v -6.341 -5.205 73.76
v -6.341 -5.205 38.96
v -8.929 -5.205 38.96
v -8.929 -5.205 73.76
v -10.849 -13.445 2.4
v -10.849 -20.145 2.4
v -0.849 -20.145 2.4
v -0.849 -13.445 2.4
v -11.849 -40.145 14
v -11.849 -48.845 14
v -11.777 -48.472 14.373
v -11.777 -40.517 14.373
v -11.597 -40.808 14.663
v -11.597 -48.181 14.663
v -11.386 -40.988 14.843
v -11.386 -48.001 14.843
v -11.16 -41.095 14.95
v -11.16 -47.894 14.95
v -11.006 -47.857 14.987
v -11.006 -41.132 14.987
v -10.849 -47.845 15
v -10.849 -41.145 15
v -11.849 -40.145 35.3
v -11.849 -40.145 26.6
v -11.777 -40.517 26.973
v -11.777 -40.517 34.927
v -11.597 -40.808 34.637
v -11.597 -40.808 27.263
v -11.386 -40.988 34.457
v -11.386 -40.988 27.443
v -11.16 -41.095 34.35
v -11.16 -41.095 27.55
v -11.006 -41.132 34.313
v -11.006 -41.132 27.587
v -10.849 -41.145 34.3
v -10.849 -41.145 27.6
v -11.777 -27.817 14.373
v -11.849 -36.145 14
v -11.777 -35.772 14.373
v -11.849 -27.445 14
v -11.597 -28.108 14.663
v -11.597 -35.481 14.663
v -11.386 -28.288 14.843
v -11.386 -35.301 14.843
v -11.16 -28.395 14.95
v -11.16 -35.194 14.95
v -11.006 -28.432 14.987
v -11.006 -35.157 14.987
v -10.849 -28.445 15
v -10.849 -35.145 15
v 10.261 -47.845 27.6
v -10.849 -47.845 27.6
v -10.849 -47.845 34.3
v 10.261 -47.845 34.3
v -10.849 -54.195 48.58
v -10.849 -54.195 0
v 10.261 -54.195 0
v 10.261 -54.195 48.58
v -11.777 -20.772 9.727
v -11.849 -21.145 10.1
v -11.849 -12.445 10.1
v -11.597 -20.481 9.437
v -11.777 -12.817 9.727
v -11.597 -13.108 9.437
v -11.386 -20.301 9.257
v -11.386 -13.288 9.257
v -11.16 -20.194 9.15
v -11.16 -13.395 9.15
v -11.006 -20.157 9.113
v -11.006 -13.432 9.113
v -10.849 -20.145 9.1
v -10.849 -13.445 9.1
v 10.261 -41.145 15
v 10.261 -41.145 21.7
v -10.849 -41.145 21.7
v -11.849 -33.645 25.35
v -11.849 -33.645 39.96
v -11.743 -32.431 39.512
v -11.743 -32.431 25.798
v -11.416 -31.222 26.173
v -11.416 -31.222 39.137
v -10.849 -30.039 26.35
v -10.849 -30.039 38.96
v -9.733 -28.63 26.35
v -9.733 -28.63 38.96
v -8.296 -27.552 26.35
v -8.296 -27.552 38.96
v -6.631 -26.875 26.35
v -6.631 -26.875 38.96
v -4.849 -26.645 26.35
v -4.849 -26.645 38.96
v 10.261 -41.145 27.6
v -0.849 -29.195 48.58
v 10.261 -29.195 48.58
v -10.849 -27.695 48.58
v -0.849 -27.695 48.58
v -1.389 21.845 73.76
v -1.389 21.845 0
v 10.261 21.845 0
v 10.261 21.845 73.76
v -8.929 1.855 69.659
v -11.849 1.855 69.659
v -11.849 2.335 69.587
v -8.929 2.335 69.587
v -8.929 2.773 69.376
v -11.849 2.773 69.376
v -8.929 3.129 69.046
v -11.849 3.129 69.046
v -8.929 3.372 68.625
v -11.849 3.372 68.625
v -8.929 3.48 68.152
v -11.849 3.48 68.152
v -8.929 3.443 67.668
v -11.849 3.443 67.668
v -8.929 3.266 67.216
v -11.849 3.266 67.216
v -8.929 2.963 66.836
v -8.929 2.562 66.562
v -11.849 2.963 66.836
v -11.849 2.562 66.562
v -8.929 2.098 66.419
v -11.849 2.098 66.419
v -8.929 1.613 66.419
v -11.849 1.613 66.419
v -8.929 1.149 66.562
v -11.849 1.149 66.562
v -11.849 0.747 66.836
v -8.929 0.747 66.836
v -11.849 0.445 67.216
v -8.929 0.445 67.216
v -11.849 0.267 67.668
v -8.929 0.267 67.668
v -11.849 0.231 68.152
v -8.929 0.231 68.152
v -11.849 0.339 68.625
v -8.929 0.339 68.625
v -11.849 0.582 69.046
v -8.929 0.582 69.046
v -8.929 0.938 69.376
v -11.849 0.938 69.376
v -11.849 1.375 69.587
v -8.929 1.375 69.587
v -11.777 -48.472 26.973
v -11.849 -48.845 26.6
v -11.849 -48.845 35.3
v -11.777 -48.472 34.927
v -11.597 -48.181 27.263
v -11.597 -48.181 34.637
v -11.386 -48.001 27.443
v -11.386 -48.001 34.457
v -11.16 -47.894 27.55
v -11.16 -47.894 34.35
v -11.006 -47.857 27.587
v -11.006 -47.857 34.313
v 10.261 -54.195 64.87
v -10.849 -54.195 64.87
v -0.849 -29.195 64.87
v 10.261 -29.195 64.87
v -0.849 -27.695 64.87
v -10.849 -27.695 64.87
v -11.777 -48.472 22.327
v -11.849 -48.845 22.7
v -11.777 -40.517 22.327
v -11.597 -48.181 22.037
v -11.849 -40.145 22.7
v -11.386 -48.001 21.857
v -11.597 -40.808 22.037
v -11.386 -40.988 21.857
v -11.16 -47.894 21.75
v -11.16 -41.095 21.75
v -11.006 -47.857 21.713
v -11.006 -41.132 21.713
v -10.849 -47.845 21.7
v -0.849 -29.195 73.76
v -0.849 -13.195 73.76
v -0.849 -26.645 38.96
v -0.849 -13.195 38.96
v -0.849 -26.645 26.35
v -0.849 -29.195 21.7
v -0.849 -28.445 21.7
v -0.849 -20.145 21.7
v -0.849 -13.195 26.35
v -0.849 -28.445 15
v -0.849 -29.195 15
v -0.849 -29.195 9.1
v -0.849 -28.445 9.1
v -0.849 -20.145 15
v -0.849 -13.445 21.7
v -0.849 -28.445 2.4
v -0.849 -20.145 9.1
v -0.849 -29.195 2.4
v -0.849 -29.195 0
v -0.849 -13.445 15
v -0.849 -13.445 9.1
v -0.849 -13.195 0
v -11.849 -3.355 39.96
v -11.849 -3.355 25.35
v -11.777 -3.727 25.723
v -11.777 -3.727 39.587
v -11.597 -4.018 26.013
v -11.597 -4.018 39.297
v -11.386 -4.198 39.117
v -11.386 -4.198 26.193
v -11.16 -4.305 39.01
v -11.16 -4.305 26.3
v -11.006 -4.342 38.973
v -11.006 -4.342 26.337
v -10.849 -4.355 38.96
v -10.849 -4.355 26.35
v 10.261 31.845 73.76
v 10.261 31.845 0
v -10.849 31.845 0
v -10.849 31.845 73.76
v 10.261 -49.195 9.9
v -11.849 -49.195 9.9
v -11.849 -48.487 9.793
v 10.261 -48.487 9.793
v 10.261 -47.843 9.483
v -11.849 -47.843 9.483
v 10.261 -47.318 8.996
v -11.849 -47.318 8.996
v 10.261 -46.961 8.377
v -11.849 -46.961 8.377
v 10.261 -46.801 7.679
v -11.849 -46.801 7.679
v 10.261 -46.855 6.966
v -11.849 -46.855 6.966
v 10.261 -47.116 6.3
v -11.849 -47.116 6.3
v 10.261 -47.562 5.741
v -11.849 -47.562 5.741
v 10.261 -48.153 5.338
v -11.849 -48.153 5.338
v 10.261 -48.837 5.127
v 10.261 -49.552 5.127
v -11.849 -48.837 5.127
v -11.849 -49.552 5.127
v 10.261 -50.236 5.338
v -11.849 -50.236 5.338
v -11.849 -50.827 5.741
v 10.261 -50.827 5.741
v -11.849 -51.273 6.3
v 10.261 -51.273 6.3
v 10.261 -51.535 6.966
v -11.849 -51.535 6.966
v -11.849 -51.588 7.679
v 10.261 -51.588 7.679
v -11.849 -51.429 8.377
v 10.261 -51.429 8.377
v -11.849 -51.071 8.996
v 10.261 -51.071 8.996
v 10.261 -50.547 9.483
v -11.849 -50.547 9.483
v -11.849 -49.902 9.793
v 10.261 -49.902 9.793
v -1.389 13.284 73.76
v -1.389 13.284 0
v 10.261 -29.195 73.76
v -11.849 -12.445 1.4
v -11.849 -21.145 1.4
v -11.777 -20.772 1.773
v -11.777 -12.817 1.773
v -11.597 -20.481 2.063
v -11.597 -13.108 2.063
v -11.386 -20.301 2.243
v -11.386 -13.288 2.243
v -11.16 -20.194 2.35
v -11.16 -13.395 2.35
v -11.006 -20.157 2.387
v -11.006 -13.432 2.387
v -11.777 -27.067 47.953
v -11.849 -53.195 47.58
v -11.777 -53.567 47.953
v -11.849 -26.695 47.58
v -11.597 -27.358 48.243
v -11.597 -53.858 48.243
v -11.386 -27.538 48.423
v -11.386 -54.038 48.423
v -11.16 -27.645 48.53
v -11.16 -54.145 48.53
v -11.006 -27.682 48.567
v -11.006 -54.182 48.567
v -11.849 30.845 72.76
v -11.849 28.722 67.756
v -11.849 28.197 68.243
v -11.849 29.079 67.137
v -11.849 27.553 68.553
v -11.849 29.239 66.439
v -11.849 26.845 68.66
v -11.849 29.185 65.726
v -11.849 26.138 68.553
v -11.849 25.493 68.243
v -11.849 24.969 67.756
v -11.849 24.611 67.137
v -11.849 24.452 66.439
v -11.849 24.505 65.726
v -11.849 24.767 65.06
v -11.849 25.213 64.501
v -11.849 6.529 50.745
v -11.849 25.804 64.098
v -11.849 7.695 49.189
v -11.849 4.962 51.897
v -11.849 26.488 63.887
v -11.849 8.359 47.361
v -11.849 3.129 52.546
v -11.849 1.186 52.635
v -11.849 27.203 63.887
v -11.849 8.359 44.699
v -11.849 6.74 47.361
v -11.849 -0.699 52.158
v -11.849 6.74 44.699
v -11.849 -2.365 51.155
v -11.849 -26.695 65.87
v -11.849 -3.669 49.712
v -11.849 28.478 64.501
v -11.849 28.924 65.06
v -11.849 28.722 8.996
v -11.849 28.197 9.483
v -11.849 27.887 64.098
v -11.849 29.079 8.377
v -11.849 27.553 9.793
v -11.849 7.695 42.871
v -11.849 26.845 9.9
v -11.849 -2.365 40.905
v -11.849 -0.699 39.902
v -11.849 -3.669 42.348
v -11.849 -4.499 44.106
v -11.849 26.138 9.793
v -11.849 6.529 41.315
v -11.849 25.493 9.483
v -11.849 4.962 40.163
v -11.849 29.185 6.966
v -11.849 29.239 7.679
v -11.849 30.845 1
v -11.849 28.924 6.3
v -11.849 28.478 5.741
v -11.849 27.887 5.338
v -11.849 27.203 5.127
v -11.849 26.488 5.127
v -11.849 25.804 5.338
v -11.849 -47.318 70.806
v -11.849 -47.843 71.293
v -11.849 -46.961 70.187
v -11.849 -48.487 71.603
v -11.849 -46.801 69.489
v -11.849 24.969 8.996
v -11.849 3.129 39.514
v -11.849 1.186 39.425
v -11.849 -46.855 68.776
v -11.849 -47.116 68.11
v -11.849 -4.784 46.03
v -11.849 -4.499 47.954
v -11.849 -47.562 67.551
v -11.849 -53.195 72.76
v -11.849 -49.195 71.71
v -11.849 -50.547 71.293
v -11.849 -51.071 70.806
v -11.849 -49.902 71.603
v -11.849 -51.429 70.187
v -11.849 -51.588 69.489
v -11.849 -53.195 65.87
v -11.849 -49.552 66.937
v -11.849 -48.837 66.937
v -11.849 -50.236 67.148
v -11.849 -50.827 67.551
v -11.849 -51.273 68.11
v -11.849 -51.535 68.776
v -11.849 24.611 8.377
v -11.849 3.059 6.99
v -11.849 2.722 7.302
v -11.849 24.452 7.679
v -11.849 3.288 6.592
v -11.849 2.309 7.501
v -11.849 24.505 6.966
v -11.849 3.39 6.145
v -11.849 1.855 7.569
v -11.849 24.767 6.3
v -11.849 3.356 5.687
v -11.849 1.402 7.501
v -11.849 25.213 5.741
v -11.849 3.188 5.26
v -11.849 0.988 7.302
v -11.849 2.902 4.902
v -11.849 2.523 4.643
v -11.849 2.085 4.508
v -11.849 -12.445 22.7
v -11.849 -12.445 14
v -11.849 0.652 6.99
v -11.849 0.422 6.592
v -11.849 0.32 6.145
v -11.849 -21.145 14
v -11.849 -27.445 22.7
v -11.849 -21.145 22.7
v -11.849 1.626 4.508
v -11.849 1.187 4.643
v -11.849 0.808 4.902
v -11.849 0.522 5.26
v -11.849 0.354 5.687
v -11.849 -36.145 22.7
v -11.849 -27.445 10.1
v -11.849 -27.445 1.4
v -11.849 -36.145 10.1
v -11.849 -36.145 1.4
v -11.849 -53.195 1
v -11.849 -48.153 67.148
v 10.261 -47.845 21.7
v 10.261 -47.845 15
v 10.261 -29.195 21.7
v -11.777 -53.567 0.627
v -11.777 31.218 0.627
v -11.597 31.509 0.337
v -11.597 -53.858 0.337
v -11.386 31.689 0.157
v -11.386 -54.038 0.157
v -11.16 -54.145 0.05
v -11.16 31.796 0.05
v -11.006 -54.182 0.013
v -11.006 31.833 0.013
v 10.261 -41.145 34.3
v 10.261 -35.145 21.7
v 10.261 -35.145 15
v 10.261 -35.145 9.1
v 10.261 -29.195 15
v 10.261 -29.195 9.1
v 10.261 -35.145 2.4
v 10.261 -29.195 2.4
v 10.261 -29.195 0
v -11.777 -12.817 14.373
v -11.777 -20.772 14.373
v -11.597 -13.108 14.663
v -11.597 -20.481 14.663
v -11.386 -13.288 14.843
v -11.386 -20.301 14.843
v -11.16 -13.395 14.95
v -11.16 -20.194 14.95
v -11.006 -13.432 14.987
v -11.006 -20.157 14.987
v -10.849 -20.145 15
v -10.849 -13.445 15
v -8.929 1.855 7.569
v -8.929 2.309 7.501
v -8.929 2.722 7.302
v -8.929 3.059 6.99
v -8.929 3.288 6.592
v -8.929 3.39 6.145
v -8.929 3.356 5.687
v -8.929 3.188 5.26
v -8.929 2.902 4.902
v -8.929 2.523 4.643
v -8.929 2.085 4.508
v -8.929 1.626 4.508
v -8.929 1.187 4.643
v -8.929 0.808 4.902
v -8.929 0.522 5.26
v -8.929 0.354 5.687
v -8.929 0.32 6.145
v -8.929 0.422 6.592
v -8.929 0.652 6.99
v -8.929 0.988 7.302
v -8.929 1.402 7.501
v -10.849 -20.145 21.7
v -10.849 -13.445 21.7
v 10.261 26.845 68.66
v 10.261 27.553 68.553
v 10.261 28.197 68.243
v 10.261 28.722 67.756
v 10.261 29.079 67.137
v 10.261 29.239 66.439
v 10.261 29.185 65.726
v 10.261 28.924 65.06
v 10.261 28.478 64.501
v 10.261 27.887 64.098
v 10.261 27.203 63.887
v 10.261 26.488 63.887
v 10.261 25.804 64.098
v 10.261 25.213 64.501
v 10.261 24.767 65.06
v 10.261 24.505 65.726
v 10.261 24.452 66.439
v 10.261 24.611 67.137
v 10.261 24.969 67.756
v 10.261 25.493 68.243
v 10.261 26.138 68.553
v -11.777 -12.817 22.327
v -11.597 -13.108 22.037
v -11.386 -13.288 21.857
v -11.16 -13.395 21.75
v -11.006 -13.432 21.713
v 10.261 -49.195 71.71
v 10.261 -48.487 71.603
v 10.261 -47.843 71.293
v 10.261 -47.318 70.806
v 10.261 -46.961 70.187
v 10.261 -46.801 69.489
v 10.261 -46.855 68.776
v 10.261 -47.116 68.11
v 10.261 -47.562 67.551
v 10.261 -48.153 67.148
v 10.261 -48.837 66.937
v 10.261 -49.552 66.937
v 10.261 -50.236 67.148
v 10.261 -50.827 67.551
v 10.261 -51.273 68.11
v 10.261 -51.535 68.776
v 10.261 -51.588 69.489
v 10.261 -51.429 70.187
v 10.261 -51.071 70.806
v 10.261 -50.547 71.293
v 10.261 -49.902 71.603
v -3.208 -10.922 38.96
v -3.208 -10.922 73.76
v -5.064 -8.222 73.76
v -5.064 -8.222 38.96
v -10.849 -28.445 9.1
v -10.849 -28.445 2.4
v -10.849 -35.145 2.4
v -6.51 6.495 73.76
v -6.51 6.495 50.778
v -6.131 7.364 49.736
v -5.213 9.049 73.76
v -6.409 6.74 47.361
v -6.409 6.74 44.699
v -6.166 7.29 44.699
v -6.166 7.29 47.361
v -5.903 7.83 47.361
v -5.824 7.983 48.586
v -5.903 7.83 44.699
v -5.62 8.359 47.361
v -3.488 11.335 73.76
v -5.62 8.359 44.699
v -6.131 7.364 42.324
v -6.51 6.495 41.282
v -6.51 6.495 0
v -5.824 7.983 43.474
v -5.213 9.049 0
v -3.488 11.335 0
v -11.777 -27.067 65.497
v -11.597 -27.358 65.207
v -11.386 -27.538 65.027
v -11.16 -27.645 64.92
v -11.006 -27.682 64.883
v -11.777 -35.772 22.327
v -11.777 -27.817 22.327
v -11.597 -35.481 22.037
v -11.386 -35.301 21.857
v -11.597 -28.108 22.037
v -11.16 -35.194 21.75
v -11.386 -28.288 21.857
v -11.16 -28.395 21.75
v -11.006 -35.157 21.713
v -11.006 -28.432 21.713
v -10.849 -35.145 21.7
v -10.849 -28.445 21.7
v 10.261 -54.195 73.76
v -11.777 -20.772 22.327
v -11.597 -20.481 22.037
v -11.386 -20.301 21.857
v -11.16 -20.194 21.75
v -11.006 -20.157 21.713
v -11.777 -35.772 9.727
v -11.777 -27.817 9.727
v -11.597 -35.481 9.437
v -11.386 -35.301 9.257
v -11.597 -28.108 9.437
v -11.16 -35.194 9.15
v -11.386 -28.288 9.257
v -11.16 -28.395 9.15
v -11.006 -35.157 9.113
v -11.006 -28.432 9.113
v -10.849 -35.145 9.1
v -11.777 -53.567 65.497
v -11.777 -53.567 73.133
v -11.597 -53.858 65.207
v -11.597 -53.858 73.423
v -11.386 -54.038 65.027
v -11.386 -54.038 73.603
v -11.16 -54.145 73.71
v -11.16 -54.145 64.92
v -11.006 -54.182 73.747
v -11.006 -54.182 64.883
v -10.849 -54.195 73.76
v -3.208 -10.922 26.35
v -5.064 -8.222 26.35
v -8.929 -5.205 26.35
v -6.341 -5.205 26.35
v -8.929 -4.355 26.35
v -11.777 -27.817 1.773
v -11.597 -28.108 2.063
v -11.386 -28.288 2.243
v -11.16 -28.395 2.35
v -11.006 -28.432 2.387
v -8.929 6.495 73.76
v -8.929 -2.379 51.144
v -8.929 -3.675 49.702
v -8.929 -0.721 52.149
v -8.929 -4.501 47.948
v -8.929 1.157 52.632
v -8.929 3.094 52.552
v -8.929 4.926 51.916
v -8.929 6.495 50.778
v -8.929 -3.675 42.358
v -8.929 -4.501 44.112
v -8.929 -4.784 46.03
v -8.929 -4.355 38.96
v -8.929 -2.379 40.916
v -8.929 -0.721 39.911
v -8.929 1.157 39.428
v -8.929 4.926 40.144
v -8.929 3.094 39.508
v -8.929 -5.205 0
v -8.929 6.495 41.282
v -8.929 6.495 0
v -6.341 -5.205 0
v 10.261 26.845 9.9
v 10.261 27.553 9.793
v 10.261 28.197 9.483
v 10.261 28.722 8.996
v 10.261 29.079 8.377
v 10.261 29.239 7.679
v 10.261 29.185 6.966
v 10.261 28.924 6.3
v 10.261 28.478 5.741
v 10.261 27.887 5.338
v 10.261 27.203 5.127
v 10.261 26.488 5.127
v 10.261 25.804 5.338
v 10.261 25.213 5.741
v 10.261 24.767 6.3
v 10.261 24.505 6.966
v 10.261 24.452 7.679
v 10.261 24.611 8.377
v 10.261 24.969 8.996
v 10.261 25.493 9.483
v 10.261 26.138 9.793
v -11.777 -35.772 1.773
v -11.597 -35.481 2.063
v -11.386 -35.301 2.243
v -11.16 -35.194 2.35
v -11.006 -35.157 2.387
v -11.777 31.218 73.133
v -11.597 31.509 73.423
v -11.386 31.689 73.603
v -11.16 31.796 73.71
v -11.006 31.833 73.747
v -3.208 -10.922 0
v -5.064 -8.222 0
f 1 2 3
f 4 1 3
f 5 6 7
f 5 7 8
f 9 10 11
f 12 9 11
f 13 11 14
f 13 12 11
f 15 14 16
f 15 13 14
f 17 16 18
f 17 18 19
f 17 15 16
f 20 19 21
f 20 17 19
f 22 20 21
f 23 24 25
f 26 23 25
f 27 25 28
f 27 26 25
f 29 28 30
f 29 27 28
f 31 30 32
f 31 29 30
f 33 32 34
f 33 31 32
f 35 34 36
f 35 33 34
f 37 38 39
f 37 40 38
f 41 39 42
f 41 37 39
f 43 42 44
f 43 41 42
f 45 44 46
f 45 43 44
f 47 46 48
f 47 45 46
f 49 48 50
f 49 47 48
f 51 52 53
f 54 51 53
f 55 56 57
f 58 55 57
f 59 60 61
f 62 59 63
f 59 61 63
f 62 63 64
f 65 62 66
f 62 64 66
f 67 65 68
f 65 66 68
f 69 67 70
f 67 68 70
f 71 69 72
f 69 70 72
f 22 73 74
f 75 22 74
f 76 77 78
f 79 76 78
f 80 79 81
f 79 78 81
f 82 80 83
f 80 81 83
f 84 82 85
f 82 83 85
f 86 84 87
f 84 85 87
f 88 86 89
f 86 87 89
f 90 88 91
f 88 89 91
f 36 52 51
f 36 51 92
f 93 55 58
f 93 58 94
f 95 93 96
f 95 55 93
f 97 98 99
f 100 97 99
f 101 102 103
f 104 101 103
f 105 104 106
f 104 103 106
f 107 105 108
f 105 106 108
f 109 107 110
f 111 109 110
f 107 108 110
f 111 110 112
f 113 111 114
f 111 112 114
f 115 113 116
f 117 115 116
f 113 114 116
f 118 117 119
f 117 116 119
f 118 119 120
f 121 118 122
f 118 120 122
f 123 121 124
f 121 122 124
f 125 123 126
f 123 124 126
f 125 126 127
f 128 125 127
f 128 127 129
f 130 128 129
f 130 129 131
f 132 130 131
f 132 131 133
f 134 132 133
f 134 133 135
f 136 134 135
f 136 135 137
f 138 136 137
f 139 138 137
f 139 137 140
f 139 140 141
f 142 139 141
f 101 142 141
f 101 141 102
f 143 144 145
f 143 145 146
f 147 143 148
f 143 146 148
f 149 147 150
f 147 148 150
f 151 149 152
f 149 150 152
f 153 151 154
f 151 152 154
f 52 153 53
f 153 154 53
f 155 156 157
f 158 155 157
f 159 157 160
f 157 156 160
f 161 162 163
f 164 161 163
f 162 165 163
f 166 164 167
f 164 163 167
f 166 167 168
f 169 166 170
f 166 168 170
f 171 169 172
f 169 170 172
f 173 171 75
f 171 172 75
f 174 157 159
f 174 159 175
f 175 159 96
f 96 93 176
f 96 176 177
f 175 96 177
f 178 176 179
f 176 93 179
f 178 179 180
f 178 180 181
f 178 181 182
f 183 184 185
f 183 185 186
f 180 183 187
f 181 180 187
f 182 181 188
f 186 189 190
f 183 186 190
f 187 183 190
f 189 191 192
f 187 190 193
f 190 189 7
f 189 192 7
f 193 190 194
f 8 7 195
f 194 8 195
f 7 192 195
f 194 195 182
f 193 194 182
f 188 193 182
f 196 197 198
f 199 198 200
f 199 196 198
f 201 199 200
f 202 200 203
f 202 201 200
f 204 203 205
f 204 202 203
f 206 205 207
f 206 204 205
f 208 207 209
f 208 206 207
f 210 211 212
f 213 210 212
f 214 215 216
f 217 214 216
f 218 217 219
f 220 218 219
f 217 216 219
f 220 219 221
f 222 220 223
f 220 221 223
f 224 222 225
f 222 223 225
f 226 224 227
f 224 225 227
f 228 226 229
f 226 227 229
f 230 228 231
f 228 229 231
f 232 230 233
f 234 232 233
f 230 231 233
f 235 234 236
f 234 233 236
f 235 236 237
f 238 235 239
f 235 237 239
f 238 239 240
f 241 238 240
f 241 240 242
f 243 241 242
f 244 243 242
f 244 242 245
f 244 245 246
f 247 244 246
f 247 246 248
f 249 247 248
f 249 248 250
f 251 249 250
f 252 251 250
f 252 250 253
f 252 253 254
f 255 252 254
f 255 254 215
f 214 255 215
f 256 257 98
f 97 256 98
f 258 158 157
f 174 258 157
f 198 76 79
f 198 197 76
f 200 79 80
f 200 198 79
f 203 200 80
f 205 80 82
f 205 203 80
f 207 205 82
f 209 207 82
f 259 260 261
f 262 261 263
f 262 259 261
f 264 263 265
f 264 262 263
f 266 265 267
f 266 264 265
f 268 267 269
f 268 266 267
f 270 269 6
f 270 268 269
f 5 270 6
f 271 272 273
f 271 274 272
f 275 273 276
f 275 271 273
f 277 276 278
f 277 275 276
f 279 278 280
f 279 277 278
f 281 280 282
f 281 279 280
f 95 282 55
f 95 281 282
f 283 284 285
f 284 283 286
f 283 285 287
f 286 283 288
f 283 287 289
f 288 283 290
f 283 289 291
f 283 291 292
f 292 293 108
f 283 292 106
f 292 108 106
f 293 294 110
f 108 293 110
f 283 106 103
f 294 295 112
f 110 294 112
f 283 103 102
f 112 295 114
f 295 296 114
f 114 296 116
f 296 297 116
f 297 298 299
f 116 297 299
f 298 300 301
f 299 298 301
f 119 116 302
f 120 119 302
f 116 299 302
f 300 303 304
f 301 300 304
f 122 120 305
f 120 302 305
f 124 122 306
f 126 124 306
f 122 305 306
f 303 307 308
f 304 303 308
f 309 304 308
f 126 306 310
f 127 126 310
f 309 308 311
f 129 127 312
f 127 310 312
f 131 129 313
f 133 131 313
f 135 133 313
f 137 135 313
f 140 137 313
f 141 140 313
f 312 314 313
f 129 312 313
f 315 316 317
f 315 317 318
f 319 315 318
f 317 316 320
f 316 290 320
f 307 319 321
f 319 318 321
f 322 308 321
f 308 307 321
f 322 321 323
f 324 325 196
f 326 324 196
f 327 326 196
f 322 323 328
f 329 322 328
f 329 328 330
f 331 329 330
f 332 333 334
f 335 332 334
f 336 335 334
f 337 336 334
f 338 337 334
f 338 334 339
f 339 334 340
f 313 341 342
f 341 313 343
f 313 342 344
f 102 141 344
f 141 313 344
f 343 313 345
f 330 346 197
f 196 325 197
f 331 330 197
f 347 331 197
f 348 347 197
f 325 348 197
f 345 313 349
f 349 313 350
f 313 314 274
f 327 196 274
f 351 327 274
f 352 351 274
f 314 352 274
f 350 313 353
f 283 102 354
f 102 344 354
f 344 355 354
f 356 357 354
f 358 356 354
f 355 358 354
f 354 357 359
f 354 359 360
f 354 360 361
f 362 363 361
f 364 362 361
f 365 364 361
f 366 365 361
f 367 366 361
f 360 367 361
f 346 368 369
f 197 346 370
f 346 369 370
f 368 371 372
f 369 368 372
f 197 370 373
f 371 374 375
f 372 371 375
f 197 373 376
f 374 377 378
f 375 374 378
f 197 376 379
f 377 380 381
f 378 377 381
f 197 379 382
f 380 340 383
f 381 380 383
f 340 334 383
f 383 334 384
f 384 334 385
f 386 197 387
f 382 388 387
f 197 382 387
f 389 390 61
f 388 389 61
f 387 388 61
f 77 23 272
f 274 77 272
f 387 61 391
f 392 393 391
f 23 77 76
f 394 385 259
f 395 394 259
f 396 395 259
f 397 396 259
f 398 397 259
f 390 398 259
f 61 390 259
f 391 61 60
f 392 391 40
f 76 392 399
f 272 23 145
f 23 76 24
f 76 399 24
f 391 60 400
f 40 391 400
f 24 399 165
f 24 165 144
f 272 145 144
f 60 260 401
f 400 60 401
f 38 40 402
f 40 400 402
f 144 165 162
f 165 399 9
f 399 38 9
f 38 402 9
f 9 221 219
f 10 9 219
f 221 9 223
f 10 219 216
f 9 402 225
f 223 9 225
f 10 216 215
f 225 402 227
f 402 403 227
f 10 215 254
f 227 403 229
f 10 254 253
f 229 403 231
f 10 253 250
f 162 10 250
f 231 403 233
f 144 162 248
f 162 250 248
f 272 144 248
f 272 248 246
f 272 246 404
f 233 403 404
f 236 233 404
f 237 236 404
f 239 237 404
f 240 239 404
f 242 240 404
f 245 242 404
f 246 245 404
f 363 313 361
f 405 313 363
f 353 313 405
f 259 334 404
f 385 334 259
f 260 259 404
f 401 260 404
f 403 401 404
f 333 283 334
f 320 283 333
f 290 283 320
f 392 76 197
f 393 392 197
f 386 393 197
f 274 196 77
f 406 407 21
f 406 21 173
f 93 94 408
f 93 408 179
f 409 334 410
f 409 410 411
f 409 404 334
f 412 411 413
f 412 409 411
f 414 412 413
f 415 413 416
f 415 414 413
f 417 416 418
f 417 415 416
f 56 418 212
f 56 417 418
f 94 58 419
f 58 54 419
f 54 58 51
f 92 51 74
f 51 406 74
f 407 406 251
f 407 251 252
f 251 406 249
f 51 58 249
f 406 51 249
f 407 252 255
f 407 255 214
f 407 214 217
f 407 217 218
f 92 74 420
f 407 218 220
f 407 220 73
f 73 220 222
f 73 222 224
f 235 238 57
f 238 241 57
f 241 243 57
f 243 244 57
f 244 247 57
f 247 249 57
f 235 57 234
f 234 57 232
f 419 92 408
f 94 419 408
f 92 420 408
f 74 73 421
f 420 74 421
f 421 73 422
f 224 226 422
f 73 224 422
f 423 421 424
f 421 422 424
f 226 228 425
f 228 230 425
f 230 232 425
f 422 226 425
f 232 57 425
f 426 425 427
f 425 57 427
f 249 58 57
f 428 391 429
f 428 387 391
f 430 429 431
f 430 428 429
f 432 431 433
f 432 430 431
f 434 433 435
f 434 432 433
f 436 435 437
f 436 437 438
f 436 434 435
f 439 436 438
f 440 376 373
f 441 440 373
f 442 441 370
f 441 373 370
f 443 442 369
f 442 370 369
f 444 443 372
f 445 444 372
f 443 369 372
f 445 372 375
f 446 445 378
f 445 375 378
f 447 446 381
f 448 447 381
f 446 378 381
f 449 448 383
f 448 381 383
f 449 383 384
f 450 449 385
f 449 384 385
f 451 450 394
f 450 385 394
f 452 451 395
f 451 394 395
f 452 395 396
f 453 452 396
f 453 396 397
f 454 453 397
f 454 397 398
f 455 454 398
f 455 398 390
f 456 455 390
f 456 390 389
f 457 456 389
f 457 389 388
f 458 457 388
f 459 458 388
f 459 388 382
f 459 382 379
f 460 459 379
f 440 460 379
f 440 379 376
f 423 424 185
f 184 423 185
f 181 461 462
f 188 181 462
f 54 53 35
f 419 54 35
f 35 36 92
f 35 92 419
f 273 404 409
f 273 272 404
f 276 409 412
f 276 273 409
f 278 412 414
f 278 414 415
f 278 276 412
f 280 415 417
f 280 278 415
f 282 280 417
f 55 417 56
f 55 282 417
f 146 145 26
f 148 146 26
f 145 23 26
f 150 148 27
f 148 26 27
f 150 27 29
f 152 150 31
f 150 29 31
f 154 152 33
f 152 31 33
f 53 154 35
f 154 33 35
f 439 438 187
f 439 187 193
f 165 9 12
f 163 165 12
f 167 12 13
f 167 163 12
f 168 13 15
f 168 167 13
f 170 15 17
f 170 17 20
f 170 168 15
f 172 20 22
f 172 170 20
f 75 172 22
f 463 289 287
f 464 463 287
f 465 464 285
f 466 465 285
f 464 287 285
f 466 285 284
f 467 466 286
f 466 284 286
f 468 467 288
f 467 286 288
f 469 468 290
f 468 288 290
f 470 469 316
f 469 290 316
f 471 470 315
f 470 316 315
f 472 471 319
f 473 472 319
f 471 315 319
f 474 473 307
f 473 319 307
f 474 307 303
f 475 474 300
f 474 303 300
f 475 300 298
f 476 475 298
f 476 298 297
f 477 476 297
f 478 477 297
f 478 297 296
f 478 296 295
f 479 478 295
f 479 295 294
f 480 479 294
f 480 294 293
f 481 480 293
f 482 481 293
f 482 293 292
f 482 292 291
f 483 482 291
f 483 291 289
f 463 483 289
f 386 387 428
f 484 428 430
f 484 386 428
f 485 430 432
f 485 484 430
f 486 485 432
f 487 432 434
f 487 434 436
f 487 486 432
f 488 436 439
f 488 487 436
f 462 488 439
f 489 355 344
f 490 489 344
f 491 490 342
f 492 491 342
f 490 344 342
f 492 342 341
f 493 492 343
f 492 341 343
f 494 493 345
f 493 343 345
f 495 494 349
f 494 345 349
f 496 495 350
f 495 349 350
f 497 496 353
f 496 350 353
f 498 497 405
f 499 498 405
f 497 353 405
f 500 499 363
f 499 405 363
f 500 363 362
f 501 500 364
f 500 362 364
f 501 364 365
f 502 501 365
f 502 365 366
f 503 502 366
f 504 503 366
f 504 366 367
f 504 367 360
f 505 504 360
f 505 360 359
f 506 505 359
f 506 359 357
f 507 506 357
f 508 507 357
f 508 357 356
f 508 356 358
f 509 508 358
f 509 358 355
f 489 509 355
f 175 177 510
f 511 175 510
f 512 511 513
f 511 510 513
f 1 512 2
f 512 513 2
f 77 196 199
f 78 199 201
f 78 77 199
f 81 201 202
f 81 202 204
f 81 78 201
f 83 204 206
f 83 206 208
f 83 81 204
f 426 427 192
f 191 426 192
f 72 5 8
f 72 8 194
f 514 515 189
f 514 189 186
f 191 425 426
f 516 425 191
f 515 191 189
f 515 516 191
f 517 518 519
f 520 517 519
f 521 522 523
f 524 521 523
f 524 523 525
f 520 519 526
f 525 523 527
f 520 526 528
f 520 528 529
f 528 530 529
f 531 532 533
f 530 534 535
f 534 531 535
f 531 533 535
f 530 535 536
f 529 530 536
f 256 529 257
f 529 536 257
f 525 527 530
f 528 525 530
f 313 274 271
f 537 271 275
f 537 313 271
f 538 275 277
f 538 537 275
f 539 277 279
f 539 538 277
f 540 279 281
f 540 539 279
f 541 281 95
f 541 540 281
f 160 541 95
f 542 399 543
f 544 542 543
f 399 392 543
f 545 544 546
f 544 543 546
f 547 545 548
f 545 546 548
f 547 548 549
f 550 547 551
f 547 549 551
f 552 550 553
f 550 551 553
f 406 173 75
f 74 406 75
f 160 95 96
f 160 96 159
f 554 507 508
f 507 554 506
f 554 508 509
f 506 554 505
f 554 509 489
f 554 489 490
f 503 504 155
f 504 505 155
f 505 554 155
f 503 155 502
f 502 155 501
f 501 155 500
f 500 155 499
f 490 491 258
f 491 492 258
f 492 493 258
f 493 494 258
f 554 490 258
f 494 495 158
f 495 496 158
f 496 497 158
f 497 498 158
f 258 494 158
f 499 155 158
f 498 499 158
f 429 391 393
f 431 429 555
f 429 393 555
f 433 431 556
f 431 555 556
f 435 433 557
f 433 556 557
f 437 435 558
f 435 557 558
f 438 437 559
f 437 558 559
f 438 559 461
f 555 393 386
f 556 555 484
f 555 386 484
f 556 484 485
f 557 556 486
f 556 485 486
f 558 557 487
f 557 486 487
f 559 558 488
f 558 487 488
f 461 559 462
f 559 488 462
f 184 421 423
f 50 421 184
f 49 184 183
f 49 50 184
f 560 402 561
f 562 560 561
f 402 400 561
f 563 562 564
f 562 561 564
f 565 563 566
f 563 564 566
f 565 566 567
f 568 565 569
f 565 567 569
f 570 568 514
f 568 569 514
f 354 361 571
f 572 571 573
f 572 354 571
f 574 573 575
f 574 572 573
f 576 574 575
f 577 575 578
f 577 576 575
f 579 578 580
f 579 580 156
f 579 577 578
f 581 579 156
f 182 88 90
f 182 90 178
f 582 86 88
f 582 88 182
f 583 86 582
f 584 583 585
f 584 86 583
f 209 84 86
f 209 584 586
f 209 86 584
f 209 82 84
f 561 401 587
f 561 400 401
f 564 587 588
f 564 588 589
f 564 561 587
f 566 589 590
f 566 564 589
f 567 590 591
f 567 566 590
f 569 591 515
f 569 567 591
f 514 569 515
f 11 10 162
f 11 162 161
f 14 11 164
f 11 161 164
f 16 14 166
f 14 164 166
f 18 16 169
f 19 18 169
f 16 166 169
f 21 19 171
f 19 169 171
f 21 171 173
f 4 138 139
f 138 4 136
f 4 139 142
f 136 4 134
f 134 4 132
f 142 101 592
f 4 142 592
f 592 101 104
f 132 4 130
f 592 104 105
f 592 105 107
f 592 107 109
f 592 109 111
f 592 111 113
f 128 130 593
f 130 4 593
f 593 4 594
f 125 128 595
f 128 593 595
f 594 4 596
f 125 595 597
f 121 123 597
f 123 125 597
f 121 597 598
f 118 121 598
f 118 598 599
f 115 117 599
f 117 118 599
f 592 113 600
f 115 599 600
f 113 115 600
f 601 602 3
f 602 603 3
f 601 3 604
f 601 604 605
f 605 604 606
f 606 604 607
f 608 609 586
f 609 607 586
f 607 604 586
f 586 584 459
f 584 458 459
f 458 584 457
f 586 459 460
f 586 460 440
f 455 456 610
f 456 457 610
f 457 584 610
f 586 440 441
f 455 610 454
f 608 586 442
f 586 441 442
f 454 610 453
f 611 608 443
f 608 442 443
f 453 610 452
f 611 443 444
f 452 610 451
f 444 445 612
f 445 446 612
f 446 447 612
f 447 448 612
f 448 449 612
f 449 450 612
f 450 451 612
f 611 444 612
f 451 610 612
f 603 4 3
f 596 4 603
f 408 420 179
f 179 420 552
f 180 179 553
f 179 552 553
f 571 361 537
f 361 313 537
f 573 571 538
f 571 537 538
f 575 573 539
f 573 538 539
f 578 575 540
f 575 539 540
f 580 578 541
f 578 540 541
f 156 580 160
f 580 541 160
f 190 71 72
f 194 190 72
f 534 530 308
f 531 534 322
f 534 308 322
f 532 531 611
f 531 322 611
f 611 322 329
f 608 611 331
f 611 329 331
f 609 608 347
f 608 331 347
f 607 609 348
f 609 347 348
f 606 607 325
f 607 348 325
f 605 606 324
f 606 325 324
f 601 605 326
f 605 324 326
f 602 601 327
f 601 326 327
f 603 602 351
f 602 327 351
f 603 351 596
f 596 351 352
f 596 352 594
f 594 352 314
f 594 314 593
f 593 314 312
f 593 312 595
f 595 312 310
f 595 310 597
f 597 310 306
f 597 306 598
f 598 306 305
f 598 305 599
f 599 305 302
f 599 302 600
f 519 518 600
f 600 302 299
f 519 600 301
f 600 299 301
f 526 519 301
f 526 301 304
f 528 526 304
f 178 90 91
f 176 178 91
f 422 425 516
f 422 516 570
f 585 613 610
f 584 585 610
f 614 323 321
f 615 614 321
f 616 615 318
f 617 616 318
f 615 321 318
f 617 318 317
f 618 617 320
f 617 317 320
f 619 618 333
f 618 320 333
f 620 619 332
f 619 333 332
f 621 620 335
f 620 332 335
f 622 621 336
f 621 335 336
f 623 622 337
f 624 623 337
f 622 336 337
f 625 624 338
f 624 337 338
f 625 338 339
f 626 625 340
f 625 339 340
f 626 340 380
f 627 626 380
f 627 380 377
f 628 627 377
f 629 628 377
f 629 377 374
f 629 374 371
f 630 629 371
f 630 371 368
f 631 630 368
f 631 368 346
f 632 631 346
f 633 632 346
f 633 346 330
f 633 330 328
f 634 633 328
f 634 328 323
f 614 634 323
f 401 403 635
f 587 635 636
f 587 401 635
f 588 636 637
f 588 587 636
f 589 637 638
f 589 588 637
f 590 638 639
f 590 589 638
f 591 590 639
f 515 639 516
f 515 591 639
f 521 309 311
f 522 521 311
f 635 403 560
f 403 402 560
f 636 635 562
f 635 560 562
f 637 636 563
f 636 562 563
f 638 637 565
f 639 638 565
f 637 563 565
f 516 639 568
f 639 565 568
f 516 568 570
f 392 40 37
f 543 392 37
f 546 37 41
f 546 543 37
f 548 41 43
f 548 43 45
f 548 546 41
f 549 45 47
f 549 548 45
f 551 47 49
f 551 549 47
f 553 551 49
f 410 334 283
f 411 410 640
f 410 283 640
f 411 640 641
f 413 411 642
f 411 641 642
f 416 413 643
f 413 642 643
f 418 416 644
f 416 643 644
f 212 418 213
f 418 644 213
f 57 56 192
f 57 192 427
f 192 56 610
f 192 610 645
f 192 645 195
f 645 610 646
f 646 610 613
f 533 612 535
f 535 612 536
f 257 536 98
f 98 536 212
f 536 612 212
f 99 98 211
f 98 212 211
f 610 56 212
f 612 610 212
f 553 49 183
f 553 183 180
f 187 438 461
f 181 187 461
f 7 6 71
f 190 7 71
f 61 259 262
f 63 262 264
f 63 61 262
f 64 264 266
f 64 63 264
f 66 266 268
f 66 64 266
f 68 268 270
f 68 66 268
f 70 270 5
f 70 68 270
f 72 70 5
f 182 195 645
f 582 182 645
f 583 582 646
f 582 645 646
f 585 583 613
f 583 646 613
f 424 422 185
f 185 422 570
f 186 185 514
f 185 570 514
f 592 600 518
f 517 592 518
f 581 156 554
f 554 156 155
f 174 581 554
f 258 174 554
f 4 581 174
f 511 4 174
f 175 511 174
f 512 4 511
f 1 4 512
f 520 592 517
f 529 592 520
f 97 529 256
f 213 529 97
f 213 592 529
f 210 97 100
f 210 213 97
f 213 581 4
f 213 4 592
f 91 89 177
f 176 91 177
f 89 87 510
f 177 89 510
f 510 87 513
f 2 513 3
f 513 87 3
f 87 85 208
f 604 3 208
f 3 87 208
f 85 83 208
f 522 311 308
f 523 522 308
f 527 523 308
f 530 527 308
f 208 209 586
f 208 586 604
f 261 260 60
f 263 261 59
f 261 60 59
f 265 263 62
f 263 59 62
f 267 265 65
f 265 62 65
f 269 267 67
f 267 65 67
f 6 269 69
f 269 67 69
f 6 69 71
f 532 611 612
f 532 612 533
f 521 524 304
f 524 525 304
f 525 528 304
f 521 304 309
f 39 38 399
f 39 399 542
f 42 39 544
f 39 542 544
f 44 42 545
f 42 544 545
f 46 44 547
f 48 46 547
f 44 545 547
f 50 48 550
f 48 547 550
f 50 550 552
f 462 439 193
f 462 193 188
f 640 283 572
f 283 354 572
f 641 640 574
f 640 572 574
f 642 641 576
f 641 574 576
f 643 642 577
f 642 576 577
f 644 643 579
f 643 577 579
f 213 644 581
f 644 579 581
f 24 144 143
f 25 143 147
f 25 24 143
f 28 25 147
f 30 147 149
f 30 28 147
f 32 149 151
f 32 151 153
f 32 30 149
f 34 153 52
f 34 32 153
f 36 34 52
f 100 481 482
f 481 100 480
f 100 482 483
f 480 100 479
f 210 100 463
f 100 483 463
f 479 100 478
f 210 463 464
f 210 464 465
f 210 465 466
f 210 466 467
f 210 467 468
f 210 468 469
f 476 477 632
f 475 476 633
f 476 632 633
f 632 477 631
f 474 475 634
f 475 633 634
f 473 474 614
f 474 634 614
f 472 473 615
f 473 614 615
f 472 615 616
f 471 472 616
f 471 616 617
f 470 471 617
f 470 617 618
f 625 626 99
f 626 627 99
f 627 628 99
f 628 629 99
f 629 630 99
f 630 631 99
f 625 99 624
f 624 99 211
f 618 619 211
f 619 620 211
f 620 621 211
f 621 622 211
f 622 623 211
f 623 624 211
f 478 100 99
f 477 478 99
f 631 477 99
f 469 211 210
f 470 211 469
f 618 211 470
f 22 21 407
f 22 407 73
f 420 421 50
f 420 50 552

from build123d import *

# Parameters (mm, degrees)
PROFILEEXTRUDE_DEPTH    = 73.76
HOSEWINDOW_W            = 16.29
HOSEWINDOW_H            = 26.5
HOSEWINDOWCUT_DEPTH     = 23.11
CAGESCREWS_R            = 2.4
CAGESCREWSCUT_DEPTH     = 23.11
AXLEHOLECUT_DEPTH       = 23.11
SETSCREWHOLES_R         = 1.539432213
SETSCREWHOLES_R_2       = 1.628953018
SETSCREWHOLESCUT_DEPTH  = 23.11
VELOCITYWINDOW_W        = 12.61
VELOCITYWINDOW_H        = 22.29
VELOCITYWINDOWCUT_DEPTH = 23.11
FILLET3_R               = 7
TRIGGERRACKSLOTCUT_W    = 6.7
TRIGGERRACKSLOTCUT_H    = 6.7
RACKSLOTCUT_DEPTH       = 23.11
FILLET4_R               = 1


with BuildPart() as part:
    # Profile → ProfileExtrude (new body)
    with BuildSketch(Plane.XY):
        with BuildLine():
            Line((10.261269376, -54.194713793), (10.261269376, -29.194713793))
            Line((10.261269376, -29.194713793), (-0.848730624, -29.194713793))
            Line((-0.848730624, -29.194713793), (-0.848730624, -13.194713793))
            ThreePointArc((-0.848730624, -13.194713793), (-4.204080189, -9.618555822), (-6.340730624, -5.204713793))
            Line((-6.340730624, -5.204713793), (-8.928730624, -5.204713793))
            Line((-8.928730624, -5.204713793), (-8.928730624, 6.495286207))
            Line((-8.928730624, 6.495286207), (-6.509650624, 6.495286207))
            ThreePointArc((-6.509650624, 6.495286207), (-4.40075771, 10.230064383), (-1.388730624, 13.283536207))
            Line((-1.388730624, 13.283536207), (-1.388730624, 21.845286207))
            Line((-1.388730624, 21.845286207), (10.261269376, 21.845286207))
            Line((10.261269376, 21.845286207), (10.261269376, 31.845286207))
            Line((10.261269376, 31.845286207), (-11.848730624, 31.845286207))
            Line((-11.848730624, 31.845286207), (-11.848730624, -54.194713793))
            Line((-11.848730624, -54.194713793), (10.261269376, -54.194713793))
        make_face()
    extrude(amount=PROFILEEXTRUDE_DEPTH)

    # HoseWindow → HoseWindowCut (cut, through all)
    with BuildSketch(Plane.ZY.offset(11.848730624)):
        with Locations((56.725, -40.944713793)):
            Rectangle(HOSEWINDOW_W, HOSEWINDOW_H)
    extrude(amount=-HOSEWINDOWCUT_DEPTH, mode=Mode.SUBTRACT)

    # CageScrews → CageScrewsCut (cut, through all)
    with BuildSketch(Plane.ZY.offset(11.848730624)):
        with Locations((7.5, 26.845286207)):
            Circle(CAGESCREWS_R)
        with Locations((66.26, 26.845286207)):
            Circle(CAGESCREWS_R)
        with Locations((7.5, -49.194713793)):
            Circle(CAGESCREWS_R)
        with Locations((69.31, -49.194713793)):
            Circle(CAGESCREWS_R)
    extrude(amount=-CAGESCREWSCUT_DEPTH, mode=Mode.SUBTRACT)

    # AxleHole → AxleHoleCut (cut, through all)
    with BuildSketch(Plane.ZY.offset(11.848730624)):
        with BuildLine():
            Line((47.361, 8.359497151), (47.361, 6.740497151))
            Line((47.361, 6.740497151), (44.699, 6.740497151))
            Line((44.699, 6.740497151), (44.699, 8.359497151))
            ThreePointArc((44.699, 8.359497151), (46.03, -4.783713793), (47.361, 8.359497151))
        make_face()
    extrude(amount=-AXLEHOLECUT_DEPTH, mode=Mode.SUBTRACT)

    # SetScrewHoles → SetScrewHolesCut (cut, through all)
    with BuildSketch(Plane.ZY.offset(11.848730624)):
        with Locations((6.03, 1.855286207)):
            Circle(SETSCREWHOLES_R)
        with Locations((68.03, 1.855286207)):
            Circle(SETSCREWHOLES_R_2)
    extrude(amount=-SETSCREWHOLESCUT_DEPTH, mode=Mode.SUBTRACT)

    # VelocityWindow → VelocityWindowCut (cut, through all)
    with BuildSketch(Plane.ZY.offset(11.848730624)):
        with Locations((32.655, -15.499713793)):
            Rectangle(VELOCITYWINDOW_W, VELOCITYWINDOW_H)
    extrude(amount=-VELOCITYWINDOWCUT_DEPTH, mode=Mode.SUBTRACT)

    # Fillet3
    fillet3_edges = [part.edges().sort_by_distance(p)[0] for p in [
        (-11.848730624, -26.644713793, 32.655),
    ]]
    fillet(fillet3_edges, radius=FILLET3_R)

    # TriggerRackSlotCut → RackSlotCut (cut, through all)
    with BuildSketch(Plane.ZY.offset(11.848730624)):
        with Locations((18.35, -44.494713793)):
            Rectangle(TRIGGERRACKSLOTCUT_W, TRIGGERRACKSLOTCUT_H)
        with Locations((30.95, -44.494713793)):
            Rectangle(TRIGGERRACKSLOTCUT_W, TRIGGERRACKSLOTCUT_H)
        with Locations((5.75, -31.794713793)):
            Rectangle(TRIGGERRACKSLOTCUT_W, TRIGGERRACKSLOTCUT_H)
        with Locations((18.35, -31.794713793)):
            Rectangle(TRIGGERRACKSLOTCUT_W, TRIGGERRACKSLOTCUT_H)
        with Locations((5.75, -16.794713793)):
            Rectangle(TRIGGERRACKSLOTCUT_W, TRIGGERRACKSLOTCUT_H)
        with Locations((18.35, -16.794713793)):
            Rectangle(TRIGGERRACKSLOTCUT_W, TRIGGERRACKSLOTCUT_H)
    extrude(amount=-RACKSLOTCUT_DEPTH, mode=Mode.SUBTRACT)

    # Fillet4
    fillet4_edges = [part.edges().sort_by_distance(p)[0] for p in [
        (-11.848730624, -11.174713793, 73.76),
        (-11.848730624, -18.999713793, 26.35),
        (-11.848730624, -18.999713793, 38.96),
        (-11.848730624, -4.354713793, 32.655),
        (-11.848730624, -44.494713793, 15),
        (-11.848730624, -47.844713793, 18.35),
        (-11.848730624, -44.494713793, 21.7),
        (-11.848730624, -41.144713793, 18.35),
        (-11.848730624, -11.174713793, 0),
        (-11.848730624, -44.494713793, 27.6),
        (-11.848730624, -47.844713793, 30.95),
        (-11.848730624, -44.494713793, 34.3),
        (-11.848730624, -41.144713793, 30.95),
        (-11.848730624, -31.794713793, 2.4),
        (-11.848730624, -35.144713793, 5.75),
        (-11.848730624, -31.794713793, 9.1),
        (-11.848730624, -28.444713793, 5.75),
        (-11.848730624, -31.794713793, 15),
        (-11.848730624, -35.144713793, 18.35),
        (-11.848730624, -31.794713793, 21.7),
        (-11.848730624, -28.444713793, 18.35),
        (-11.848730624, -16.794713793, 2.4),
        (-11.848730624, -20.144713793, 5.75),
        (-11.848730624, -16.794713793, 9.1),
        (-11.848730624, -13.444713793, 5.75),
        (-11.848730624, -54.194713793, 69.315),
        (-11.848730624, 31.845286207, 36.88),
        (-11.848730624, -16.794713793, 15),
        (-11.848730624, -20.144713793, 18.35),
        (-11.848730624, -16.794713793, 21.7),
        (-11.848730624, -13.444713793, 18.35),
        (-11.848730624, -54.194713793, 24.29),
        (-11.848730624, -40.944713793, 64.87),
        (-11.848730624, -27.694713793, 56.725),
        (-11.848730624, -40.944713793, 48.58),
    ]]
    fillet(fillet4_edges, radius=FILLET4_R)


solid = part.part
